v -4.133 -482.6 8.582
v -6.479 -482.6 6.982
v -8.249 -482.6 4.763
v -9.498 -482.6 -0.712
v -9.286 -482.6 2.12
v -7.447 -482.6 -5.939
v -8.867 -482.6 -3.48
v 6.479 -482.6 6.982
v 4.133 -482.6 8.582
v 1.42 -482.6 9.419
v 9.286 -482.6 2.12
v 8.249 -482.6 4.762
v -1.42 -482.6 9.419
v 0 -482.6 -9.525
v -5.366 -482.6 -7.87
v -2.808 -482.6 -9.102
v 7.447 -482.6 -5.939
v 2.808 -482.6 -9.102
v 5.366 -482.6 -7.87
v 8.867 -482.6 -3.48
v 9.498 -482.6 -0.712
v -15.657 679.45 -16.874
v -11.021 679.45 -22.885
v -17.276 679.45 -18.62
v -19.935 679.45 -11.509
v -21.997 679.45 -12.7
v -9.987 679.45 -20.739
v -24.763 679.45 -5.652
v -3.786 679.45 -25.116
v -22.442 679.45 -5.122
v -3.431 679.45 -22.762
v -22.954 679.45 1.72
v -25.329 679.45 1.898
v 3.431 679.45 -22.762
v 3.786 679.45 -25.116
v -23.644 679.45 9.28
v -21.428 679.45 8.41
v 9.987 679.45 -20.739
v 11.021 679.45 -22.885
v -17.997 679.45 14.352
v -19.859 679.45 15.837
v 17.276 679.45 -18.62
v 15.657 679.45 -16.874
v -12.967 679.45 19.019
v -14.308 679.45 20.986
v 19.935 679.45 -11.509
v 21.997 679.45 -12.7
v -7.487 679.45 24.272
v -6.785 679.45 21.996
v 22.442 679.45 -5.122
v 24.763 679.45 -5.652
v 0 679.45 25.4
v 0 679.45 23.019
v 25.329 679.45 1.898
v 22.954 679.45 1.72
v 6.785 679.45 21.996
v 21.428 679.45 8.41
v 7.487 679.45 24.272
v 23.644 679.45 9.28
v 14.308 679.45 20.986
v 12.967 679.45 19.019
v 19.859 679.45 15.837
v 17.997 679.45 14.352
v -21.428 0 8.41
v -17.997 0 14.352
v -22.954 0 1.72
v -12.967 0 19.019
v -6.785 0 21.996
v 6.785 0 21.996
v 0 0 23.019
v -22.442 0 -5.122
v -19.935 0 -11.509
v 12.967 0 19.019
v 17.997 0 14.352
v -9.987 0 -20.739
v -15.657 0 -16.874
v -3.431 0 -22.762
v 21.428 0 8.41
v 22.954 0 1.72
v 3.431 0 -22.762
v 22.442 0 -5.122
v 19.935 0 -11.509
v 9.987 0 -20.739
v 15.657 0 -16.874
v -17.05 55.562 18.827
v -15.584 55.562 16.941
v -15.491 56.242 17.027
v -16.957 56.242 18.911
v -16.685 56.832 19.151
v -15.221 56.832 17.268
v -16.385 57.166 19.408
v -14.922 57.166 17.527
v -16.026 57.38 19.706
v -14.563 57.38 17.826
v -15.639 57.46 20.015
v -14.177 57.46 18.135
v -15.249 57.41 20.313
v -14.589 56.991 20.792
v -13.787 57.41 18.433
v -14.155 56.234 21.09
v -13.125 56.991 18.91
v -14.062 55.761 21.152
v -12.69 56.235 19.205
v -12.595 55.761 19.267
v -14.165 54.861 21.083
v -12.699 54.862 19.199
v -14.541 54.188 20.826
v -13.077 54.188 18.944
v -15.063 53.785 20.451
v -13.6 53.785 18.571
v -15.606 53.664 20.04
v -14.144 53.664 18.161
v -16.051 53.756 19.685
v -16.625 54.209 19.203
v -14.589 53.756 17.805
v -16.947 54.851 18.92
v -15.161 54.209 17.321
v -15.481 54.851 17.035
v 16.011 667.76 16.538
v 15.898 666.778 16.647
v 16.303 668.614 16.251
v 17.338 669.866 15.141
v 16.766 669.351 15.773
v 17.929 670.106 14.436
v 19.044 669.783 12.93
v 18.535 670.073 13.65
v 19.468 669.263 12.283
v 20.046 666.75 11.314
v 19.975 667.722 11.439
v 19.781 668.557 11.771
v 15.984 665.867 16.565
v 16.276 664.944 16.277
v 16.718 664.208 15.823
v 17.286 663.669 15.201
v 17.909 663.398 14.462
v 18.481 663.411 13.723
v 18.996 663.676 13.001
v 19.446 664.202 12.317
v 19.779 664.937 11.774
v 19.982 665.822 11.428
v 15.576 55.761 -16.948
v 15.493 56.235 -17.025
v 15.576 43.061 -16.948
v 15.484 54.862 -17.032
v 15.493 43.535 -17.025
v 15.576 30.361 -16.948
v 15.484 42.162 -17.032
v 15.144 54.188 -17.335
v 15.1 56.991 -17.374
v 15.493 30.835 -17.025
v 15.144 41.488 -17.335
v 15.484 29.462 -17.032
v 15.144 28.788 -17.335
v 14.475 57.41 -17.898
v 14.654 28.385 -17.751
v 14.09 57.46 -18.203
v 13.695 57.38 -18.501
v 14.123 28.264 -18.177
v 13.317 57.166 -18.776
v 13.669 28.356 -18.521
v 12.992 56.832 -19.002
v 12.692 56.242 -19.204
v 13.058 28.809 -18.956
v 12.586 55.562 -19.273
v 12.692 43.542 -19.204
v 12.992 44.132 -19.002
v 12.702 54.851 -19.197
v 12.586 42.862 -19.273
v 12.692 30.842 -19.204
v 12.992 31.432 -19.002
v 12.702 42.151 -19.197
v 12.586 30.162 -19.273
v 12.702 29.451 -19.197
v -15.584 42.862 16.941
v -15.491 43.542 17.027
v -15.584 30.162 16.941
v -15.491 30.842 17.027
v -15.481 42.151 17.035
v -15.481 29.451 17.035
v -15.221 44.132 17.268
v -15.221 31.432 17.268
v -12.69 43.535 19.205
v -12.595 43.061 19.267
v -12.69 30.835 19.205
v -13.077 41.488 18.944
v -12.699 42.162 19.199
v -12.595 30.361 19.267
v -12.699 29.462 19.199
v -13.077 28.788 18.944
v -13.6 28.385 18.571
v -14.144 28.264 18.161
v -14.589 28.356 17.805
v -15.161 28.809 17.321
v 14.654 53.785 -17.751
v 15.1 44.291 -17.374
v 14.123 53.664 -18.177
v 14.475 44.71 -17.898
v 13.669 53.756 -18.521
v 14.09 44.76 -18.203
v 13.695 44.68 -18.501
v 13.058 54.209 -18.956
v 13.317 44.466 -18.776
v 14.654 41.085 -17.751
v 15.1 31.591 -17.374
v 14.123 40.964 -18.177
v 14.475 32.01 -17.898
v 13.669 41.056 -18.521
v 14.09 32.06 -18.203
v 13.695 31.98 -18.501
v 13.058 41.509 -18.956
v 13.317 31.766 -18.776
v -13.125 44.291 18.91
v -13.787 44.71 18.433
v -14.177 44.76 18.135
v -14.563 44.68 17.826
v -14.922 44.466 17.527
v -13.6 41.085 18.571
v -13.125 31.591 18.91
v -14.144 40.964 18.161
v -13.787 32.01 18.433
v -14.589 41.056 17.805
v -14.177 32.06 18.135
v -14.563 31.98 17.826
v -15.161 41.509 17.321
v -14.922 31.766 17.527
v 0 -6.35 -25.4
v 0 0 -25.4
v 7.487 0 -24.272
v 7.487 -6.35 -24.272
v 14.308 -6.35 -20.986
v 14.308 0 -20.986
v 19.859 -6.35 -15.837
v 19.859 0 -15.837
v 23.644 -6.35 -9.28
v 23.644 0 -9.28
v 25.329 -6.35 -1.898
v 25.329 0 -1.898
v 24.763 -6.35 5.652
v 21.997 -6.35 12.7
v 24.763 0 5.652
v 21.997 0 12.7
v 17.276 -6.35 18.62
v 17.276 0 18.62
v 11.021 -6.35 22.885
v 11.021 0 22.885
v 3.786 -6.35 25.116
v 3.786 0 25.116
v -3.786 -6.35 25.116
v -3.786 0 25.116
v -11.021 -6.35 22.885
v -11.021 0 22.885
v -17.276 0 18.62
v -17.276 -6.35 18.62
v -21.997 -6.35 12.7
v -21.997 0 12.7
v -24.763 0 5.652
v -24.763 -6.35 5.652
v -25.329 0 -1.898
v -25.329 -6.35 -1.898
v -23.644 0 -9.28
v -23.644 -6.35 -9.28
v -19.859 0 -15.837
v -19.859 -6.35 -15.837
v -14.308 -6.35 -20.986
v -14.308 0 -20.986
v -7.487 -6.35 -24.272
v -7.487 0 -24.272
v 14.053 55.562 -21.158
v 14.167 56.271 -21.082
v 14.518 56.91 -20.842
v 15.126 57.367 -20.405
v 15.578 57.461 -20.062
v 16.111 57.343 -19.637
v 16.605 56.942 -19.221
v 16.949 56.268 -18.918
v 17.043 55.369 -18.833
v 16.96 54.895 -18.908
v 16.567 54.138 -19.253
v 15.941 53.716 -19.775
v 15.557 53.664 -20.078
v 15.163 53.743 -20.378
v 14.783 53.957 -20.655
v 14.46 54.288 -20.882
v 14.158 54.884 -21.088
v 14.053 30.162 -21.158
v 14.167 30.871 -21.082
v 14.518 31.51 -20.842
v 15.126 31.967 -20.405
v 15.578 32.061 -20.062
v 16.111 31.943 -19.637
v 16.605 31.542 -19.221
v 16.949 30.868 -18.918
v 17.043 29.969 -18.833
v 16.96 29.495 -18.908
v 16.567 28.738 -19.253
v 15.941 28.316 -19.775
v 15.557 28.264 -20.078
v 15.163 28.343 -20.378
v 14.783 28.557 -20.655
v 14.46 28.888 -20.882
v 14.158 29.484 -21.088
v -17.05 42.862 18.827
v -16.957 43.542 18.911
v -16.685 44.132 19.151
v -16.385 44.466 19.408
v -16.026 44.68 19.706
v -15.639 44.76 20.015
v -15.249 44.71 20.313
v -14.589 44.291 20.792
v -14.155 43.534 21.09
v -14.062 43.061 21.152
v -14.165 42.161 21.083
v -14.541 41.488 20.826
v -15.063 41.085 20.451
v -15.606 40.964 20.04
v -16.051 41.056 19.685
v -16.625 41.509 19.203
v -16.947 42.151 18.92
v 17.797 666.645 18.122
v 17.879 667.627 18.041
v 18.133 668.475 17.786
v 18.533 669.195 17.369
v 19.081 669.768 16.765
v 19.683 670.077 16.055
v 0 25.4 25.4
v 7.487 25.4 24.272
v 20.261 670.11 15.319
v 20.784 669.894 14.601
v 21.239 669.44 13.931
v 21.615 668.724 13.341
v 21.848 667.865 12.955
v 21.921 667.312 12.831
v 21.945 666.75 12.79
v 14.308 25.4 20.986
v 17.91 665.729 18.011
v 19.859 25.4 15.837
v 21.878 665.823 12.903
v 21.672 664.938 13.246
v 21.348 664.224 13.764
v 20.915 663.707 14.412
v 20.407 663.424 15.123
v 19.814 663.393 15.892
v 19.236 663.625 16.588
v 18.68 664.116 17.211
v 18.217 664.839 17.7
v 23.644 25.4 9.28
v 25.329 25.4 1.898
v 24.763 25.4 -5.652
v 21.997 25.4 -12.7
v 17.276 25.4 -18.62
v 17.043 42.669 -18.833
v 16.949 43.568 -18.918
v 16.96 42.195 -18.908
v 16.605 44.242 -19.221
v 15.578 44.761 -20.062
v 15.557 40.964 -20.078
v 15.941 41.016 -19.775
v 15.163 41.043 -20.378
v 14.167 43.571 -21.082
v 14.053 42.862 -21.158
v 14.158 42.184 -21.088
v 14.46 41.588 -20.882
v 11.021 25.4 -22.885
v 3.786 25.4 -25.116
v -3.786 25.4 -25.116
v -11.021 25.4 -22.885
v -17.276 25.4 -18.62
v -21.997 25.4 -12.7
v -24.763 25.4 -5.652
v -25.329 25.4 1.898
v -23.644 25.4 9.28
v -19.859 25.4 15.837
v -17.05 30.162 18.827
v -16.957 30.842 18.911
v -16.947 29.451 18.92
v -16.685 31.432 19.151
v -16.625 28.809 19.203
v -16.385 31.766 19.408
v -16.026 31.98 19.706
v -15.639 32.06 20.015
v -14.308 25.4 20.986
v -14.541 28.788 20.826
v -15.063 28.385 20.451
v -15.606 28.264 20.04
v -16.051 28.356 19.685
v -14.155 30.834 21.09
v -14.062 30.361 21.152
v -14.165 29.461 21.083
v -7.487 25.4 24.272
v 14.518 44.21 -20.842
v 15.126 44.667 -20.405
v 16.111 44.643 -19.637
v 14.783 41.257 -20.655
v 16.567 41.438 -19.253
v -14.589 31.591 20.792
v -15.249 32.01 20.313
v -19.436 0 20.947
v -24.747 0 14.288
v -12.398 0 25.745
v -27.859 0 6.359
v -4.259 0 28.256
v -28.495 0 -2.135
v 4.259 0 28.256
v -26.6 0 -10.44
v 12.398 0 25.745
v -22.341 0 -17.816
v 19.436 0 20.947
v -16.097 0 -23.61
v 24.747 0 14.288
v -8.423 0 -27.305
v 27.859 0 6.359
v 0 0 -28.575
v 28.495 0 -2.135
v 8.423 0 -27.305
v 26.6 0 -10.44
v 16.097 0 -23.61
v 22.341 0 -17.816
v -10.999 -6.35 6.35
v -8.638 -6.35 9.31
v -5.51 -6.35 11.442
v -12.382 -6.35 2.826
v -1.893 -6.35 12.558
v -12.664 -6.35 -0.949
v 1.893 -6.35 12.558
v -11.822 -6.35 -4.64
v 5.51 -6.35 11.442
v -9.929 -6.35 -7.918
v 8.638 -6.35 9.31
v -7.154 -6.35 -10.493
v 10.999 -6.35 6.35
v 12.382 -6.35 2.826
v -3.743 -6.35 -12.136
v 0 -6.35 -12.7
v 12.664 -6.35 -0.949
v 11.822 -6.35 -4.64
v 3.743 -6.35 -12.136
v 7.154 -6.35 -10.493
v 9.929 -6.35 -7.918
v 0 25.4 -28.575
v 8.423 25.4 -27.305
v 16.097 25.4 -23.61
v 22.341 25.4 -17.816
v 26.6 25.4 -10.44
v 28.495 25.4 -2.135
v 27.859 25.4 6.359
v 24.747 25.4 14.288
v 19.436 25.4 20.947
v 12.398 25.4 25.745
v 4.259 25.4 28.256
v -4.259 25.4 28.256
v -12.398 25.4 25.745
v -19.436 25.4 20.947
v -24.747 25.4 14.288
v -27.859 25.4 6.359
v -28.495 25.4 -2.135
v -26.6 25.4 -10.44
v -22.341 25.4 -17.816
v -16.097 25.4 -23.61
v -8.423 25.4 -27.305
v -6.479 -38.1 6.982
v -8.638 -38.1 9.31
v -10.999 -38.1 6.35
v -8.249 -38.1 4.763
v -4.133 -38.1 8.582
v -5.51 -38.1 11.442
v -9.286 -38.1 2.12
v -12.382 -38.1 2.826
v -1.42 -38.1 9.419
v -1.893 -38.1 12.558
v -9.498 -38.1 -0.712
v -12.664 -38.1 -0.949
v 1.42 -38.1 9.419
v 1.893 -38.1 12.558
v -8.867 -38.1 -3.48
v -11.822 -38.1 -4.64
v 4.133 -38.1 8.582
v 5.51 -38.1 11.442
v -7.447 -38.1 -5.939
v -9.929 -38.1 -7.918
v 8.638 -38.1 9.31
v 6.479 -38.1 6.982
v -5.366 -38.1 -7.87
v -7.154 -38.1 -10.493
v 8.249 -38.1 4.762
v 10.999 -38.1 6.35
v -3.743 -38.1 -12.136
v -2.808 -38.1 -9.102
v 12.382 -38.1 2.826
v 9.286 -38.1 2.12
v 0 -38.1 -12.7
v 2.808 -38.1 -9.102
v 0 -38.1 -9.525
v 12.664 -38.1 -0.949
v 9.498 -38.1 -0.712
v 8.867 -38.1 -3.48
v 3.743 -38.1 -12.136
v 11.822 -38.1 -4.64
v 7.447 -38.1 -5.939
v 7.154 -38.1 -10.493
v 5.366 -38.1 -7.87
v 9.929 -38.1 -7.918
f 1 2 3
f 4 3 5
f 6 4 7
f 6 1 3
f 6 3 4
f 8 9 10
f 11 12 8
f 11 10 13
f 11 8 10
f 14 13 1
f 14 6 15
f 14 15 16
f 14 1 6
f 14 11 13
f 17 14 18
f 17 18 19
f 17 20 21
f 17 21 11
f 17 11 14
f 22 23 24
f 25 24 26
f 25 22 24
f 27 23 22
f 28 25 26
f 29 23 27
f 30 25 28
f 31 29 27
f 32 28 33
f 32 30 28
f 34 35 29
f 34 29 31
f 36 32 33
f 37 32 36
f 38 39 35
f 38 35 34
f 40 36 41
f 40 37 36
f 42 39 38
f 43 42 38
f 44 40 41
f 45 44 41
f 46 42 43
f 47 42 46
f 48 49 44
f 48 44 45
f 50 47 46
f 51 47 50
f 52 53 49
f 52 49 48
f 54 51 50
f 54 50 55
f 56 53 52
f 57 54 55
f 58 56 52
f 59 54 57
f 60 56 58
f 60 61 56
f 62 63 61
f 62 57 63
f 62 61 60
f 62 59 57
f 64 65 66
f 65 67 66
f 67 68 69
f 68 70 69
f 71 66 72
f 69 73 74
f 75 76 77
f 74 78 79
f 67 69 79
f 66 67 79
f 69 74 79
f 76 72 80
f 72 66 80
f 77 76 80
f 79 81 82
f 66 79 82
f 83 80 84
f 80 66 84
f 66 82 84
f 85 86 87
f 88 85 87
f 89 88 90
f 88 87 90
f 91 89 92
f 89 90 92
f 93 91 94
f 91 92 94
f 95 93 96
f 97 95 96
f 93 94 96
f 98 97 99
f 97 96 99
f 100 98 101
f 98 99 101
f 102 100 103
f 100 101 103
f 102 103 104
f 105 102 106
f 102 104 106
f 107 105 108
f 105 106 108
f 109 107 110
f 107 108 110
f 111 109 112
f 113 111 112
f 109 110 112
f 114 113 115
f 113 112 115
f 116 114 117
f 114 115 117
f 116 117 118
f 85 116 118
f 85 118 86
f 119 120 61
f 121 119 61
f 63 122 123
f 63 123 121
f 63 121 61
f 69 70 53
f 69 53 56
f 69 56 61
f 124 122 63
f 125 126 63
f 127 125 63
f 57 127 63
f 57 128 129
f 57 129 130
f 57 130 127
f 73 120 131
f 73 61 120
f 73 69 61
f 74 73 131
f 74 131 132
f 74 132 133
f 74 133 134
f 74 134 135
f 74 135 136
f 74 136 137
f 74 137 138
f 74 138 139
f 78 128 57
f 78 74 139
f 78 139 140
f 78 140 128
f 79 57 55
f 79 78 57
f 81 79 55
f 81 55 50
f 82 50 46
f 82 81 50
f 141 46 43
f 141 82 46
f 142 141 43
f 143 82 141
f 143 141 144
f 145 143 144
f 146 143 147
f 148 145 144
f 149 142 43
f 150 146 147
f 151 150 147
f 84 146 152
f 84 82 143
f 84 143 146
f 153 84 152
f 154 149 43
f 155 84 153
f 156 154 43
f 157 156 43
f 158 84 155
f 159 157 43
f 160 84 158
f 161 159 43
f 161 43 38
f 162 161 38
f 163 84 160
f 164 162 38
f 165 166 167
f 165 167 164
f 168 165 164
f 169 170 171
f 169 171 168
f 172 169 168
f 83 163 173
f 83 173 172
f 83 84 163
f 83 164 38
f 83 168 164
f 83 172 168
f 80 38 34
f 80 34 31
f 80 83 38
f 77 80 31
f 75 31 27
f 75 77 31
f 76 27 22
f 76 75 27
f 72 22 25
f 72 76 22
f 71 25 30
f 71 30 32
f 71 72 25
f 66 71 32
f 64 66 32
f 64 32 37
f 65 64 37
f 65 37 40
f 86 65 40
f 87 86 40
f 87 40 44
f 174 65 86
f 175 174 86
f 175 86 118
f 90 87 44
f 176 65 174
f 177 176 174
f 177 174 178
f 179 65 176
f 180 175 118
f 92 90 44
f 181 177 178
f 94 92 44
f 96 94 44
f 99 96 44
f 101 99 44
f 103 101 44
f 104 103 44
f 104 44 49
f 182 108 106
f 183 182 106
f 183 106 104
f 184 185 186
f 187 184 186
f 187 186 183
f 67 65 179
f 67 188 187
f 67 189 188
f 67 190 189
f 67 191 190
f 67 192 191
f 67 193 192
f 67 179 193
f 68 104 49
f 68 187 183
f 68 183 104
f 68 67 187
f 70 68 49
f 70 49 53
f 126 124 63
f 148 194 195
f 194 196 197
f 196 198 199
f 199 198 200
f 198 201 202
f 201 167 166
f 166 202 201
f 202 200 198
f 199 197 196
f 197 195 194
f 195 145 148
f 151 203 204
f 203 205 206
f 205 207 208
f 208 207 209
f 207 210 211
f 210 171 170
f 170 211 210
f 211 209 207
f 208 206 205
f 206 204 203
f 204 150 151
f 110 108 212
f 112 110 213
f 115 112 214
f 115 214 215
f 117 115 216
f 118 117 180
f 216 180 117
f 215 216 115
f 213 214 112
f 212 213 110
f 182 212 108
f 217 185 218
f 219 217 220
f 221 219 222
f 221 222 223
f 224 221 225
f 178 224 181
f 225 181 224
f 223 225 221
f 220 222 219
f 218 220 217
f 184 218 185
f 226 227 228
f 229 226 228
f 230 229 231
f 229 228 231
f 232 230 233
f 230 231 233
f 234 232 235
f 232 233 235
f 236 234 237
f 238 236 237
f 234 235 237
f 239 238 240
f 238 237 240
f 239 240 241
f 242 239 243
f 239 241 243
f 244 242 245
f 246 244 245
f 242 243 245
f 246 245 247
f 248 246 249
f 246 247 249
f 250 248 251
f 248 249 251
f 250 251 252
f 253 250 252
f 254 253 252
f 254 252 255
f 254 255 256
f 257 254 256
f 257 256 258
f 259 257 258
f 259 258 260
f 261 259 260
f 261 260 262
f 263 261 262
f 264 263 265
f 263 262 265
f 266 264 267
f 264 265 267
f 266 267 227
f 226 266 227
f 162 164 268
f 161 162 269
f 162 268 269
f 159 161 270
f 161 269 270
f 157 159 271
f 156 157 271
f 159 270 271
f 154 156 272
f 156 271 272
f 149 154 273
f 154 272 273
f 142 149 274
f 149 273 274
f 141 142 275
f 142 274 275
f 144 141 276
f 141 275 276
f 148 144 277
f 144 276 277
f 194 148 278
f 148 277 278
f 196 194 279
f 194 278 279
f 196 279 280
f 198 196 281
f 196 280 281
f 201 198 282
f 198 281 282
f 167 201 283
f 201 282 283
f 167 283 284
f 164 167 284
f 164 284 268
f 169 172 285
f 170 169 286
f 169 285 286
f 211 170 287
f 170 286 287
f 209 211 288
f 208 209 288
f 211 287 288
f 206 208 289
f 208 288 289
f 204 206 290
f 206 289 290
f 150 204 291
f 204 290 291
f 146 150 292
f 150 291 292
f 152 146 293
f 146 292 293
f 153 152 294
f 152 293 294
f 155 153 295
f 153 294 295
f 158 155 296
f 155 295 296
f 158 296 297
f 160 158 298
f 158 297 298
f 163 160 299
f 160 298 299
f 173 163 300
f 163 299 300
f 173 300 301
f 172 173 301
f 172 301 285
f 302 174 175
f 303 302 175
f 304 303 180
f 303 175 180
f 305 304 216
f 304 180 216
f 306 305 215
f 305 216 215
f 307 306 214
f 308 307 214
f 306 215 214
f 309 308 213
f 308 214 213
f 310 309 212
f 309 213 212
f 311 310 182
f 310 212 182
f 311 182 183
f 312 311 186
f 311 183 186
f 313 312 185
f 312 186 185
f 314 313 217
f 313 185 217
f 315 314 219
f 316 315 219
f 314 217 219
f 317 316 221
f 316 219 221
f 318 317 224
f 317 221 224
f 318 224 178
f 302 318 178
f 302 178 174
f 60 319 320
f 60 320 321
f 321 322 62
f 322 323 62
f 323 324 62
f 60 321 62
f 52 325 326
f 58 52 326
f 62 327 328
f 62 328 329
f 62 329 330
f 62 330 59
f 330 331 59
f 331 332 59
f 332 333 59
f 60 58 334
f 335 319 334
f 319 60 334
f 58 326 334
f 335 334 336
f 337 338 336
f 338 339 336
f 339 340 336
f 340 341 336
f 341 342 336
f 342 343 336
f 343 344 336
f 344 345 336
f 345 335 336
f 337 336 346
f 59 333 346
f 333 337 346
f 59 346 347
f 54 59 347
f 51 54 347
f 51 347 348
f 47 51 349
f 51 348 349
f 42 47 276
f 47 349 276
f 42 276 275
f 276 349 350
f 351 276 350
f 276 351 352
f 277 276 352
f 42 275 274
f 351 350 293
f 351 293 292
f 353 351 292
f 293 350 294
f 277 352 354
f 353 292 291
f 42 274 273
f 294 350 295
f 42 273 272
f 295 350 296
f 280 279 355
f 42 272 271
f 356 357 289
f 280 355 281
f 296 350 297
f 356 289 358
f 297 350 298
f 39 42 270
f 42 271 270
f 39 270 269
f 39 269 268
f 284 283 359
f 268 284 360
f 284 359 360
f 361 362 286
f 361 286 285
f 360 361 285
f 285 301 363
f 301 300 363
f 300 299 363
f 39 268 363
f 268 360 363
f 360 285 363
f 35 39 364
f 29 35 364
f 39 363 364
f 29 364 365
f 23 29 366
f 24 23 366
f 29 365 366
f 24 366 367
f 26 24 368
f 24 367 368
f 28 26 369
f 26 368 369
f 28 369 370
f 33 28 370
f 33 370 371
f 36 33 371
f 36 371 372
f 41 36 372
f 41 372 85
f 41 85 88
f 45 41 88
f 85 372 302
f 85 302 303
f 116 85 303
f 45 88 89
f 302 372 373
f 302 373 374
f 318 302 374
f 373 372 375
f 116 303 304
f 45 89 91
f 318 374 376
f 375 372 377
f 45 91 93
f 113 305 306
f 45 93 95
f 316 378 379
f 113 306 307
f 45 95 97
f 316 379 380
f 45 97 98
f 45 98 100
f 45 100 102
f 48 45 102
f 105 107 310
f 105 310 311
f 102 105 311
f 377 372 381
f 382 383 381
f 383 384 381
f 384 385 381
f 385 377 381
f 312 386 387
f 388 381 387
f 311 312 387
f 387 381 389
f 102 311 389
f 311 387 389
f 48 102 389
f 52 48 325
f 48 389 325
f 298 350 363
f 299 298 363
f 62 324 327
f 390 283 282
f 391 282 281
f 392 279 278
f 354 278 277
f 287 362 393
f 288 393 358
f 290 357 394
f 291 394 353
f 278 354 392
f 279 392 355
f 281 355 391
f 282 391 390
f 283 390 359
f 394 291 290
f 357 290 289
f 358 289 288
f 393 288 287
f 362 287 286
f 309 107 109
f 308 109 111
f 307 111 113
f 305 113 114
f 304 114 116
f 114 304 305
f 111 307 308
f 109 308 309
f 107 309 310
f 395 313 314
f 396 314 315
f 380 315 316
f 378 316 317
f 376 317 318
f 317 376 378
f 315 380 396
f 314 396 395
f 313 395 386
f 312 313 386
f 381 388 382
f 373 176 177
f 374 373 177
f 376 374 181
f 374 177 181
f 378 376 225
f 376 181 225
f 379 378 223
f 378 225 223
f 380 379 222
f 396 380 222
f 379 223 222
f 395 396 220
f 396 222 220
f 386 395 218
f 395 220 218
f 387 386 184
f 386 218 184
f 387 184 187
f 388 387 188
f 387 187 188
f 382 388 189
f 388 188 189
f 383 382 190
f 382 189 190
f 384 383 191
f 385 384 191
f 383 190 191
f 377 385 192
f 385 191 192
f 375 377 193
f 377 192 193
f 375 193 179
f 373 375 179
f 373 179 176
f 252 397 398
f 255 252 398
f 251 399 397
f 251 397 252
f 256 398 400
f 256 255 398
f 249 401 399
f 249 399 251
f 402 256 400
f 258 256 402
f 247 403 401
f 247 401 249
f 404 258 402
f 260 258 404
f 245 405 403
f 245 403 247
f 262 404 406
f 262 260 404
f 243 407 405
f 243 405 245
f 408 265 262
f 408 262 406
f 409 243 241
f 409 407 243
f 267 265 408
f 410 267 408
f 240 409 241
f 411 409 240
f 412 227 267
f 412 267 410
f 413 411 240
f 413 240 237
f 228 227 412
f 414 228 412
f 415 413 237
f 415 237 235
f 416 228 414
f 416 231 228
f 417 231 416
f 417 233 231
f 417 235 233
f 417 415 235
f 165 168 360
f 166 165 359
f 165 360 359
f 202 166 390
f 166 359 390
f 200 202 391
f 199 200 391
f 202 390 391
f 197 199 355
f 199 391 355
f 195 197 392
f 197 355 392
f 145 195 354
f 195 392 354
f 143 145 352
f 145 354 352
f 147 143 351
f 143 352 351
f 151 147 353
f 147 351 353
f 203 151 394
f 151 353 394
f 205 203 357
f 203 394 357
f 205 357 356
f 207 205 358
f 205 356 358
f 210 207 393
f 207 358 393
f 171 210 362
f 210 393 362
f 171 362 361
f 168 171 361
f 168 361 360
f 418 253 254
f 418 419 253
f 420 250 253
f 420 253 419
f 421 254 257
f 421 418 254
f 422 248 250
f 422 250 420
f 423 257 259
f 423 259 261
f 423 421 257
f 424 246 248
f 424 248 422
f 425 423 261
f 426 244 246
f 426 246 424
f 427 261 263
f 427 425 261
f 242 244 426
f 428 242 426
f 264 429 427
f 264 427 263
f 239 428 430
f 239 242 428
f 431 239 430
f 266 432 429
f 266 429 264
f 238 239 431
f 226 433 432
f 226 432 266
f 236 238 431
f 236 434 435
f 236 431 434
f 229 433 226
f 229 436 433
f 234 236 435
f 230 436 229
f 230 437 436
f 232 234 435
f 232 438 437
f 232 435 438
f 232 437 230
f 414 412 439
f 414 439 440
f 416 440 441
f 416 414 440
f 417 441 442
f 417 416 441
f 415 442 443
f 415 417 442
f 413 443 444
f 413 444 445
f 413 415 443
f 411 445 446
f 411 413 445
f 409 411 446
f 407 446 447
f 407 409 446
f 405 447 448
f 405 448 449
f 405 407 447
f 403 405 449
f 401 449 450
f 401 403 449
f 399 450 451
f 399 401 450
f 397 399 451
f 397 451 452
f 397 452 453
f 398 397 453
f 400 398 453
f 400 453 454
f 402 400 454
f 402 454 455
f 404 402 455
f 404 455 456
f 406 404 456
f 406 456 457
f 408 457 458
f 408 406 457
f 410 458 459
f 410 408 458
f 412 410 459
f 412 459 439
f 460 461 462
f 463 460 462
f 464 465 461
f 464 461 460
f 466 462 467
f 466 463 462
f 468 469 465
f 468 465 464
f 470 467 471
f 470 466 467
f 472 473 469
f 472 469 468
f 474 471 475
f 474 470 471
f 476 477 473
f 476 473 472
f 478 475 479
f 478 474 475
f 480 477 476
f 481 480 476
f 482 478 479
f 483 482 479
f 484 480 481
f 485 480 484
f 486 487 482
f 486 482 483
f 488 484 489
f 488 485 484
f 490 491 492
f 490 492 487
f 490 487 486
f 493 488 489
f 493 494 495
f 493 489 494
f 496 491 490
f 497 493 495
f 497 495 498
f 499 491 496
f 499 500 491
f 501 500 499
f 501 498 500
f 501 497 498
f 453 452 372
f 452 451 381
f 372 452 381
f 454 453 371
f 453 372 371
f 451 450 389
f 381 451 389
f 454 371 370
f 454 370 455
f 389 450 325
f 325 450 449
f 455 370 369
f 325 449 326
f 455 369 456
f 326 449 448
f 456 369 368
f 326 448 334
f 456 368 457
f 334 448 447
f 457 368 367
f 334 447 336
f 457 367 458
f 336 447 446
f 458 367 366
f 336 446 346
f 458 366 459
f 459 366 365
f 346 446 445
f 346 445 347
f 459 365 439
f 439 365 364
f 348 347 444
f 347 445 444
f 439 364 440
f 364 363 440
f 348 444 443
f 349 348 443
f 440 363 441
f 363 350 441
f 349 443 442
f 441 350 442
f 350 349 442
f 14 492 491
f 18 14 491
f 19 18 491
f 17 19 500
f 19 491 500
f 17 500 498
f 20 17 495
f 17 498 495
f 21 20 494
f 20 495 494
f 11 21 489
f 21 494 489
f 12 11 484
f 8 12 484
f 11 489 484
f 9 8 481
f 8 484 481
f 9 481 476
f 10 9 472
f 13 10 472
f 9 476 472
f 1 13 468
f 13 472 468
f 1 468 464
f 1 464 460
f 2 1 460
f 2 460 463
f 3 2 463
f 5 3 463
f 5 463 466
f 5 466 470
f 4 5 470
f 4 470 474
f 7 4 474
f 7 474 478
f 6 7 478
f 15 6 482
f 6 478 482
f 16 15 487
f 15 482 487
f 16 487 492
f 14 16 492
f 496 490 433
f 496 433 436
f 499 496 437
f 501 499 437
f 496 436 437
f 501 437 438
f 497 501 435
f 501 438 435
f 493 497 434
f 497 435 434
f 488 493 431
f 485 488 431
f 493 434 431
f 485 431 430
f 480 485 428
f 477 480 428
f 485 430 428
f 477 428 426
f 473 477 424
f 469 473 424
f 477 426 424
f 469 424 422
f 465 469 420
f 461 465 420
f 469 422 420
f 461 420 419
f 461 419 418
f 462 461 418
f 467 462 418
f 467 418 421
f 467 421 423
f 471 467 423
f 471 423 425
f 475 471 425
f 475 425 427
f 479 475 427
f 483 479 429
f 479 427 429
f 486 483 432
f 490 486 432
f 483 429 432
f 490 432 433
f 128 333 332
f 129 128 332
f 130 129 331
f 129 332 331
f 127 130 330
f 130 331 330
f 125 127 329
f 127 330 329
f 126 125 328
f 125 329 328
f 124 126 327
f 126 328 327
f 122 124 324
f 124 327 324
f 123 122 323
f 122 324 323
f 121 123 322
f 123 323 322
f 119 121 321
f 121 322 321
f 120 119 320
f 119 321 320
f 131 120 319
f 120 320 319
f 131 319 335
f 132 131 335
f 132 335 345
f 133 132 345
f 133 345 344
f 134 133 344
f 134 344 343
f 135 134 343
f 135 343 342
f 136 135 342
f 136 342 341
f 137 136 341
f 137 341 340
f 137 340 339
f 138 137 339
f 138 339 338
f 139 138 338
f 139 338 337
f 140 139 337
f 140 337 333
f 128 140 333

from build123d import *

# Parameters (mm, degrees)
SKETCH1_R                    = 25.4
SKETCH1_R_2                  = 23.01875
BOSS_EXTRUDE1_DEPTH          = 679.45
SKETCH2_R                    = 28.575
SKETCH2_R_2                  = 25.4
BOSS_EXTRUDE2_DEPTH          = 25.4
SKETCH4_R                    = 1.89865
CUT_EXTRUDE1_DEPTH           = 683.618175501
SKETCH5_R                    = 25.4
BOSS_EXTRUDE4_DEPTH          = 6.35
SKETCH6_R                    = 12.7
BOSS_EXTRUDE5_DEPTH          = 31.75
SKETCH7_R                    = 9.525
BOSS_EXTRUDE6_DEPTH          = 444.5
F_1_4_CLEARANCE_HOLE1_REACH  = 684.618
F_1_4_CLEARANCE_HOLE1_BORE_R = 3.3782


with BuildPart() as part:
    # Sketch1 → Boss-Extrude1 (new body)
    with BuildSketch(Plane(origin=(0, 0, 0), x_dir=(1, 0, 0), z_dir=(0, 1, 0))):
        with Locations(Location((0, 0, 0), (0, 0, 270))):
            Circle(SKETCH1_R)
        with Locations(Location((0, 0, 0), (0, 0, 270))):
            Circle(SKETCH1_R_2, mode=Mode.SUBTRACT)
    extrude(amount=BOSS_EXTRUDE1_DEPTH)

    # Sketch2 → Boss-Extrude2 (add)
    with BuildSketch(Plane(origin=(0, 0, 0), x_dir=(-1, 0, 0), z_dir=(0, -1, 0))):
        with Locations(Location((0, 0, 0), (0, 0, 90))):
            Circle(SKETCH2_R)
        with Locations(Location((0, 0, 0), (0, 0, 90))):
            Circle(SKETCH2_R_2, mode=Mode.SUBTRACT)
    extrude(amount=-BOSS_EXTRUDE2_DEPTH)

    # Sketch4 → Cut-Extrude1 (cut, through all)
    with BuildSketch(Plane(origin=(15.595341272, 0, -20.048574278), x_dir=(-0.7893139479687464, 0, -0.6139898138747834), z_dir=(0.6139898138747834, 0, -0.7893139479687464))):
        with Locations((0, 55.5625)):
            Circle(SKETCH4_R)
        with Locations((0, 42.8625)):
            Circle(SKETCH4_R)
        with Locations((0, 30.1625)):
            Circle(SKETCH4_R)
    extrude(amount=-CUT_EXTRUDE1_DEPTH, mode=Mode.SUBTRACT)

    # Sketch5 → Boss-Extrude4 (add)
    with BuildSketch(Plane.XZ):
        with Locations(Location((0, 0, 0), (0, 0, 270))):
            Circle(SKETCH5_R)
    extrude(amount=BOSS_EXTRUDE4_DEPTH)

    # Sketch6 → Boss-Extrude5 (add)
    with BuildSketch(Plane.XZ.offset(6.35)):
        with Locations(Location((0, 0, 0), (0, 0, 270))):
            Circle(SKETCH6_R)
    extrude(amount=BOSS_EXTRUDE5_DEPTH)

    # Sketch7 → Boss-Extrude6 (add)
    with BuildSketch(Plane.XZ.offset(38.1)):
        with Locations(Location((0, 0, 0), (0, 0, 270))):
            Circle(SKETCH7_R)
    extrude(amount=BOSS_EXTRUDE6_DEPTH)

    # 1/4 Clearance Hole1 bore → 1/4 Clearance Hole1 (cut, up to next)
    with BuildSketch(Plane(origin=(20.048574278, 0, 15.595341272), x_dir=(0.6139898138747835, 0, -0.7893139479687464), z_dir=(0.7893139479687464, 0, 0.6139898138747835)), mode=Mode.PRIVATE) as f_1_4_clearance_hole1_sk1:
        with Locations((0, 666.75)):
            Circle(F_1_4_CLEARANCE_HOLE1_BORE_R)
    f_1_4_clearance_hole1_tool1 = extrude(f_1_4_clearance_hole1_sk1.sketch, amount=-F_1_4_CLEARANCE_HOLE1_REACH, mode=Mode.PRIVATE) & part.part
    add(f_1_4_clearance_hole1_tool1.solids().sort_by_distance((20.048574, 666.75, 15.595341))[0], mode=Mode.SUBTRACT)


solid = part.part
